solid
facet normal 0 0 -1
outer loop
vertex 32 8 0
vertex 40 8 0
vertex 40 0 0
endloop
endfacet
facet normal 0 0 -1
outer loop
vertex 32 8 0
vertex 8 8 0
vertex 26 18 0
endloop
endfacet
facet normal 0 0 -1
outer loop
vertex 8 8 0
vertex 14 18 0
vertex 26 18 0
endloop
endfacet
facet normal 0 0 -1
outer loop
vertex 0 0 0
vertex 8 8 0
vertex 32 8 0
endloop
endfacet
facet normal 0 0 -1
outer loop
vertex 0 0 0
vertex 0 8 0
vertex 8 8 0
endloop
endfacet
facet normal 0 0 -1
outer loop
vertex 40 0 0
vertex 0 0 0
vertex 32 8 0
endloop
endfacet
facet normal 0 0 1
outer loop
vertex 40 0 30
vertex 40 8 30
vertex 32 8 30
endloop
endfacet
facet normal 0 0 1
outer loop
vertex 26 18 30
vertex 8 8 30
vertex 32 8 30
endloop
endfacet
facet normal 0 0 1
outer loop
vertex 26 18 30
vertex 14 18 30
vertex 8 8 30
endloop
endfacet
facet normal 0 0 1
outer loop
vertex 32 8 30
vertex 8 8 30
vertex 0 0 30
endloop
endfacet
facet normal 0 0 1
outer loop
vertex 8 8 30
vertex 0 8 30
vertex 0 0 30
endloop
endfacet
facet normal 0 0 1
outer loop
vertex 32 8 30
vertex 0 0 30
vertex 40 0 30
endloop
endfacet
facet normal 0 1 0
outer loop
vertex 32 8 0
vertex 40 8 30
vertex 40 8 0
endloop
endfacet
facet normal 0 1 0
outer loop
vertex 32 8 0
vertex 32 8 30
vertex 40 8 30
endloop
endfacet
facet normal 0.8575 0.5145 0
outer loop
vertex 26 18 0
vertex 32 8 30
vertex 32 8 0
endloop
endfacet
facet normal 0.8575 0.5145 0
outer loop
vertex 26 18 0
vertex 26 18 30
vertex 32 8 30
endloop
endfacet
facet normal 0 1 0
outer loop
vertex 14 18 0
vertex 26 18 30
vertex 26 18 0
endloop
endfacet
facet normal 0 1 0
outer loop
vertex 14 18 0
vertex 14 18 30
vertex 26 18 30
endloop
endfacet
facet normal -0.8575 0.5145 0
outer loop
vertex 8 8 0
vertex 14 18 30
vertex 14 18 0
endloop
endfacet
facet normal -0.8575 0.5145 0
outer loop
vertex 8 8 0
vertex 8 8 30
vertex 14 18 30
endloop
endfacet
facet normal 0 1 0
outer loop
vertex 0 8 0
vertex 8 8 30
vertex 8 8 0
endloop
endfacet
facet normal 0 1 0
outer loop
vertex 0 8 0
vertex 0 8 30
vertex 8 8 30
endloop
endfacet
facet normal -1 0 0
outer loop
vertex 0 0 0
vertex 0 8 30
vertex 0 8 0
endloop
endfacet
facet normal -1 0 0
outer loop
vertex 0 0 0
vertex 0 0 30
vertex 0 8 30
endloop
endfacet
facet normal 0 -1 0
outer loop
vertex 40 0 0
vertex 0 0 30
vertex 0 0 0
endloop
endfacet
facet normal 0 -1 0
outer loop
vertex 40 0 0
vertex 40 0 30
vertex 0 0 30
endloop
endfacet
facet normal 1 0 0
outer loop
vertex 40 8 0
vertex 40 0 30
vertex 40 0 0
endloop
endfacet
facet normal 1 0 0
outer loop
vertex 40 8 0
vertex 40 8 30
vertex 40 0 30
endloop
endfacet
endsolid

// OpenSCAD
$fn = 32;

// ----------------------------------------------------------------------
// V guide rail: dovetail, 40 mm wide
// ----------------------------------------------------------------------

// --- parameters (mm) ---
rail_w = 40;              // rail width, X
base_t = 8;               // base plate thickness
v_depth = 10;             // V feature depth / height
v_half_w = 12;            // half width of the V at the base face
plate_t = 30;             // rail length, Z (the extrusion height)
top_half_w = 6;           // half width at the dovetail top

dovetail_base = 2 * v_half_w;  // dovetail width at the base
dovetail_top = 2 * top_half_w;  // dovetail width at the top

profile = [[0, 0], [40, 0], [40, 8], [32, 8], [26, 18], [14, 18], [8, 8], [0, 8]];  // primary outline, 8 points, counter clockwise

// --- the one profile operation ---
linear_extrude(height = plate_t) polygon(points = profile);
